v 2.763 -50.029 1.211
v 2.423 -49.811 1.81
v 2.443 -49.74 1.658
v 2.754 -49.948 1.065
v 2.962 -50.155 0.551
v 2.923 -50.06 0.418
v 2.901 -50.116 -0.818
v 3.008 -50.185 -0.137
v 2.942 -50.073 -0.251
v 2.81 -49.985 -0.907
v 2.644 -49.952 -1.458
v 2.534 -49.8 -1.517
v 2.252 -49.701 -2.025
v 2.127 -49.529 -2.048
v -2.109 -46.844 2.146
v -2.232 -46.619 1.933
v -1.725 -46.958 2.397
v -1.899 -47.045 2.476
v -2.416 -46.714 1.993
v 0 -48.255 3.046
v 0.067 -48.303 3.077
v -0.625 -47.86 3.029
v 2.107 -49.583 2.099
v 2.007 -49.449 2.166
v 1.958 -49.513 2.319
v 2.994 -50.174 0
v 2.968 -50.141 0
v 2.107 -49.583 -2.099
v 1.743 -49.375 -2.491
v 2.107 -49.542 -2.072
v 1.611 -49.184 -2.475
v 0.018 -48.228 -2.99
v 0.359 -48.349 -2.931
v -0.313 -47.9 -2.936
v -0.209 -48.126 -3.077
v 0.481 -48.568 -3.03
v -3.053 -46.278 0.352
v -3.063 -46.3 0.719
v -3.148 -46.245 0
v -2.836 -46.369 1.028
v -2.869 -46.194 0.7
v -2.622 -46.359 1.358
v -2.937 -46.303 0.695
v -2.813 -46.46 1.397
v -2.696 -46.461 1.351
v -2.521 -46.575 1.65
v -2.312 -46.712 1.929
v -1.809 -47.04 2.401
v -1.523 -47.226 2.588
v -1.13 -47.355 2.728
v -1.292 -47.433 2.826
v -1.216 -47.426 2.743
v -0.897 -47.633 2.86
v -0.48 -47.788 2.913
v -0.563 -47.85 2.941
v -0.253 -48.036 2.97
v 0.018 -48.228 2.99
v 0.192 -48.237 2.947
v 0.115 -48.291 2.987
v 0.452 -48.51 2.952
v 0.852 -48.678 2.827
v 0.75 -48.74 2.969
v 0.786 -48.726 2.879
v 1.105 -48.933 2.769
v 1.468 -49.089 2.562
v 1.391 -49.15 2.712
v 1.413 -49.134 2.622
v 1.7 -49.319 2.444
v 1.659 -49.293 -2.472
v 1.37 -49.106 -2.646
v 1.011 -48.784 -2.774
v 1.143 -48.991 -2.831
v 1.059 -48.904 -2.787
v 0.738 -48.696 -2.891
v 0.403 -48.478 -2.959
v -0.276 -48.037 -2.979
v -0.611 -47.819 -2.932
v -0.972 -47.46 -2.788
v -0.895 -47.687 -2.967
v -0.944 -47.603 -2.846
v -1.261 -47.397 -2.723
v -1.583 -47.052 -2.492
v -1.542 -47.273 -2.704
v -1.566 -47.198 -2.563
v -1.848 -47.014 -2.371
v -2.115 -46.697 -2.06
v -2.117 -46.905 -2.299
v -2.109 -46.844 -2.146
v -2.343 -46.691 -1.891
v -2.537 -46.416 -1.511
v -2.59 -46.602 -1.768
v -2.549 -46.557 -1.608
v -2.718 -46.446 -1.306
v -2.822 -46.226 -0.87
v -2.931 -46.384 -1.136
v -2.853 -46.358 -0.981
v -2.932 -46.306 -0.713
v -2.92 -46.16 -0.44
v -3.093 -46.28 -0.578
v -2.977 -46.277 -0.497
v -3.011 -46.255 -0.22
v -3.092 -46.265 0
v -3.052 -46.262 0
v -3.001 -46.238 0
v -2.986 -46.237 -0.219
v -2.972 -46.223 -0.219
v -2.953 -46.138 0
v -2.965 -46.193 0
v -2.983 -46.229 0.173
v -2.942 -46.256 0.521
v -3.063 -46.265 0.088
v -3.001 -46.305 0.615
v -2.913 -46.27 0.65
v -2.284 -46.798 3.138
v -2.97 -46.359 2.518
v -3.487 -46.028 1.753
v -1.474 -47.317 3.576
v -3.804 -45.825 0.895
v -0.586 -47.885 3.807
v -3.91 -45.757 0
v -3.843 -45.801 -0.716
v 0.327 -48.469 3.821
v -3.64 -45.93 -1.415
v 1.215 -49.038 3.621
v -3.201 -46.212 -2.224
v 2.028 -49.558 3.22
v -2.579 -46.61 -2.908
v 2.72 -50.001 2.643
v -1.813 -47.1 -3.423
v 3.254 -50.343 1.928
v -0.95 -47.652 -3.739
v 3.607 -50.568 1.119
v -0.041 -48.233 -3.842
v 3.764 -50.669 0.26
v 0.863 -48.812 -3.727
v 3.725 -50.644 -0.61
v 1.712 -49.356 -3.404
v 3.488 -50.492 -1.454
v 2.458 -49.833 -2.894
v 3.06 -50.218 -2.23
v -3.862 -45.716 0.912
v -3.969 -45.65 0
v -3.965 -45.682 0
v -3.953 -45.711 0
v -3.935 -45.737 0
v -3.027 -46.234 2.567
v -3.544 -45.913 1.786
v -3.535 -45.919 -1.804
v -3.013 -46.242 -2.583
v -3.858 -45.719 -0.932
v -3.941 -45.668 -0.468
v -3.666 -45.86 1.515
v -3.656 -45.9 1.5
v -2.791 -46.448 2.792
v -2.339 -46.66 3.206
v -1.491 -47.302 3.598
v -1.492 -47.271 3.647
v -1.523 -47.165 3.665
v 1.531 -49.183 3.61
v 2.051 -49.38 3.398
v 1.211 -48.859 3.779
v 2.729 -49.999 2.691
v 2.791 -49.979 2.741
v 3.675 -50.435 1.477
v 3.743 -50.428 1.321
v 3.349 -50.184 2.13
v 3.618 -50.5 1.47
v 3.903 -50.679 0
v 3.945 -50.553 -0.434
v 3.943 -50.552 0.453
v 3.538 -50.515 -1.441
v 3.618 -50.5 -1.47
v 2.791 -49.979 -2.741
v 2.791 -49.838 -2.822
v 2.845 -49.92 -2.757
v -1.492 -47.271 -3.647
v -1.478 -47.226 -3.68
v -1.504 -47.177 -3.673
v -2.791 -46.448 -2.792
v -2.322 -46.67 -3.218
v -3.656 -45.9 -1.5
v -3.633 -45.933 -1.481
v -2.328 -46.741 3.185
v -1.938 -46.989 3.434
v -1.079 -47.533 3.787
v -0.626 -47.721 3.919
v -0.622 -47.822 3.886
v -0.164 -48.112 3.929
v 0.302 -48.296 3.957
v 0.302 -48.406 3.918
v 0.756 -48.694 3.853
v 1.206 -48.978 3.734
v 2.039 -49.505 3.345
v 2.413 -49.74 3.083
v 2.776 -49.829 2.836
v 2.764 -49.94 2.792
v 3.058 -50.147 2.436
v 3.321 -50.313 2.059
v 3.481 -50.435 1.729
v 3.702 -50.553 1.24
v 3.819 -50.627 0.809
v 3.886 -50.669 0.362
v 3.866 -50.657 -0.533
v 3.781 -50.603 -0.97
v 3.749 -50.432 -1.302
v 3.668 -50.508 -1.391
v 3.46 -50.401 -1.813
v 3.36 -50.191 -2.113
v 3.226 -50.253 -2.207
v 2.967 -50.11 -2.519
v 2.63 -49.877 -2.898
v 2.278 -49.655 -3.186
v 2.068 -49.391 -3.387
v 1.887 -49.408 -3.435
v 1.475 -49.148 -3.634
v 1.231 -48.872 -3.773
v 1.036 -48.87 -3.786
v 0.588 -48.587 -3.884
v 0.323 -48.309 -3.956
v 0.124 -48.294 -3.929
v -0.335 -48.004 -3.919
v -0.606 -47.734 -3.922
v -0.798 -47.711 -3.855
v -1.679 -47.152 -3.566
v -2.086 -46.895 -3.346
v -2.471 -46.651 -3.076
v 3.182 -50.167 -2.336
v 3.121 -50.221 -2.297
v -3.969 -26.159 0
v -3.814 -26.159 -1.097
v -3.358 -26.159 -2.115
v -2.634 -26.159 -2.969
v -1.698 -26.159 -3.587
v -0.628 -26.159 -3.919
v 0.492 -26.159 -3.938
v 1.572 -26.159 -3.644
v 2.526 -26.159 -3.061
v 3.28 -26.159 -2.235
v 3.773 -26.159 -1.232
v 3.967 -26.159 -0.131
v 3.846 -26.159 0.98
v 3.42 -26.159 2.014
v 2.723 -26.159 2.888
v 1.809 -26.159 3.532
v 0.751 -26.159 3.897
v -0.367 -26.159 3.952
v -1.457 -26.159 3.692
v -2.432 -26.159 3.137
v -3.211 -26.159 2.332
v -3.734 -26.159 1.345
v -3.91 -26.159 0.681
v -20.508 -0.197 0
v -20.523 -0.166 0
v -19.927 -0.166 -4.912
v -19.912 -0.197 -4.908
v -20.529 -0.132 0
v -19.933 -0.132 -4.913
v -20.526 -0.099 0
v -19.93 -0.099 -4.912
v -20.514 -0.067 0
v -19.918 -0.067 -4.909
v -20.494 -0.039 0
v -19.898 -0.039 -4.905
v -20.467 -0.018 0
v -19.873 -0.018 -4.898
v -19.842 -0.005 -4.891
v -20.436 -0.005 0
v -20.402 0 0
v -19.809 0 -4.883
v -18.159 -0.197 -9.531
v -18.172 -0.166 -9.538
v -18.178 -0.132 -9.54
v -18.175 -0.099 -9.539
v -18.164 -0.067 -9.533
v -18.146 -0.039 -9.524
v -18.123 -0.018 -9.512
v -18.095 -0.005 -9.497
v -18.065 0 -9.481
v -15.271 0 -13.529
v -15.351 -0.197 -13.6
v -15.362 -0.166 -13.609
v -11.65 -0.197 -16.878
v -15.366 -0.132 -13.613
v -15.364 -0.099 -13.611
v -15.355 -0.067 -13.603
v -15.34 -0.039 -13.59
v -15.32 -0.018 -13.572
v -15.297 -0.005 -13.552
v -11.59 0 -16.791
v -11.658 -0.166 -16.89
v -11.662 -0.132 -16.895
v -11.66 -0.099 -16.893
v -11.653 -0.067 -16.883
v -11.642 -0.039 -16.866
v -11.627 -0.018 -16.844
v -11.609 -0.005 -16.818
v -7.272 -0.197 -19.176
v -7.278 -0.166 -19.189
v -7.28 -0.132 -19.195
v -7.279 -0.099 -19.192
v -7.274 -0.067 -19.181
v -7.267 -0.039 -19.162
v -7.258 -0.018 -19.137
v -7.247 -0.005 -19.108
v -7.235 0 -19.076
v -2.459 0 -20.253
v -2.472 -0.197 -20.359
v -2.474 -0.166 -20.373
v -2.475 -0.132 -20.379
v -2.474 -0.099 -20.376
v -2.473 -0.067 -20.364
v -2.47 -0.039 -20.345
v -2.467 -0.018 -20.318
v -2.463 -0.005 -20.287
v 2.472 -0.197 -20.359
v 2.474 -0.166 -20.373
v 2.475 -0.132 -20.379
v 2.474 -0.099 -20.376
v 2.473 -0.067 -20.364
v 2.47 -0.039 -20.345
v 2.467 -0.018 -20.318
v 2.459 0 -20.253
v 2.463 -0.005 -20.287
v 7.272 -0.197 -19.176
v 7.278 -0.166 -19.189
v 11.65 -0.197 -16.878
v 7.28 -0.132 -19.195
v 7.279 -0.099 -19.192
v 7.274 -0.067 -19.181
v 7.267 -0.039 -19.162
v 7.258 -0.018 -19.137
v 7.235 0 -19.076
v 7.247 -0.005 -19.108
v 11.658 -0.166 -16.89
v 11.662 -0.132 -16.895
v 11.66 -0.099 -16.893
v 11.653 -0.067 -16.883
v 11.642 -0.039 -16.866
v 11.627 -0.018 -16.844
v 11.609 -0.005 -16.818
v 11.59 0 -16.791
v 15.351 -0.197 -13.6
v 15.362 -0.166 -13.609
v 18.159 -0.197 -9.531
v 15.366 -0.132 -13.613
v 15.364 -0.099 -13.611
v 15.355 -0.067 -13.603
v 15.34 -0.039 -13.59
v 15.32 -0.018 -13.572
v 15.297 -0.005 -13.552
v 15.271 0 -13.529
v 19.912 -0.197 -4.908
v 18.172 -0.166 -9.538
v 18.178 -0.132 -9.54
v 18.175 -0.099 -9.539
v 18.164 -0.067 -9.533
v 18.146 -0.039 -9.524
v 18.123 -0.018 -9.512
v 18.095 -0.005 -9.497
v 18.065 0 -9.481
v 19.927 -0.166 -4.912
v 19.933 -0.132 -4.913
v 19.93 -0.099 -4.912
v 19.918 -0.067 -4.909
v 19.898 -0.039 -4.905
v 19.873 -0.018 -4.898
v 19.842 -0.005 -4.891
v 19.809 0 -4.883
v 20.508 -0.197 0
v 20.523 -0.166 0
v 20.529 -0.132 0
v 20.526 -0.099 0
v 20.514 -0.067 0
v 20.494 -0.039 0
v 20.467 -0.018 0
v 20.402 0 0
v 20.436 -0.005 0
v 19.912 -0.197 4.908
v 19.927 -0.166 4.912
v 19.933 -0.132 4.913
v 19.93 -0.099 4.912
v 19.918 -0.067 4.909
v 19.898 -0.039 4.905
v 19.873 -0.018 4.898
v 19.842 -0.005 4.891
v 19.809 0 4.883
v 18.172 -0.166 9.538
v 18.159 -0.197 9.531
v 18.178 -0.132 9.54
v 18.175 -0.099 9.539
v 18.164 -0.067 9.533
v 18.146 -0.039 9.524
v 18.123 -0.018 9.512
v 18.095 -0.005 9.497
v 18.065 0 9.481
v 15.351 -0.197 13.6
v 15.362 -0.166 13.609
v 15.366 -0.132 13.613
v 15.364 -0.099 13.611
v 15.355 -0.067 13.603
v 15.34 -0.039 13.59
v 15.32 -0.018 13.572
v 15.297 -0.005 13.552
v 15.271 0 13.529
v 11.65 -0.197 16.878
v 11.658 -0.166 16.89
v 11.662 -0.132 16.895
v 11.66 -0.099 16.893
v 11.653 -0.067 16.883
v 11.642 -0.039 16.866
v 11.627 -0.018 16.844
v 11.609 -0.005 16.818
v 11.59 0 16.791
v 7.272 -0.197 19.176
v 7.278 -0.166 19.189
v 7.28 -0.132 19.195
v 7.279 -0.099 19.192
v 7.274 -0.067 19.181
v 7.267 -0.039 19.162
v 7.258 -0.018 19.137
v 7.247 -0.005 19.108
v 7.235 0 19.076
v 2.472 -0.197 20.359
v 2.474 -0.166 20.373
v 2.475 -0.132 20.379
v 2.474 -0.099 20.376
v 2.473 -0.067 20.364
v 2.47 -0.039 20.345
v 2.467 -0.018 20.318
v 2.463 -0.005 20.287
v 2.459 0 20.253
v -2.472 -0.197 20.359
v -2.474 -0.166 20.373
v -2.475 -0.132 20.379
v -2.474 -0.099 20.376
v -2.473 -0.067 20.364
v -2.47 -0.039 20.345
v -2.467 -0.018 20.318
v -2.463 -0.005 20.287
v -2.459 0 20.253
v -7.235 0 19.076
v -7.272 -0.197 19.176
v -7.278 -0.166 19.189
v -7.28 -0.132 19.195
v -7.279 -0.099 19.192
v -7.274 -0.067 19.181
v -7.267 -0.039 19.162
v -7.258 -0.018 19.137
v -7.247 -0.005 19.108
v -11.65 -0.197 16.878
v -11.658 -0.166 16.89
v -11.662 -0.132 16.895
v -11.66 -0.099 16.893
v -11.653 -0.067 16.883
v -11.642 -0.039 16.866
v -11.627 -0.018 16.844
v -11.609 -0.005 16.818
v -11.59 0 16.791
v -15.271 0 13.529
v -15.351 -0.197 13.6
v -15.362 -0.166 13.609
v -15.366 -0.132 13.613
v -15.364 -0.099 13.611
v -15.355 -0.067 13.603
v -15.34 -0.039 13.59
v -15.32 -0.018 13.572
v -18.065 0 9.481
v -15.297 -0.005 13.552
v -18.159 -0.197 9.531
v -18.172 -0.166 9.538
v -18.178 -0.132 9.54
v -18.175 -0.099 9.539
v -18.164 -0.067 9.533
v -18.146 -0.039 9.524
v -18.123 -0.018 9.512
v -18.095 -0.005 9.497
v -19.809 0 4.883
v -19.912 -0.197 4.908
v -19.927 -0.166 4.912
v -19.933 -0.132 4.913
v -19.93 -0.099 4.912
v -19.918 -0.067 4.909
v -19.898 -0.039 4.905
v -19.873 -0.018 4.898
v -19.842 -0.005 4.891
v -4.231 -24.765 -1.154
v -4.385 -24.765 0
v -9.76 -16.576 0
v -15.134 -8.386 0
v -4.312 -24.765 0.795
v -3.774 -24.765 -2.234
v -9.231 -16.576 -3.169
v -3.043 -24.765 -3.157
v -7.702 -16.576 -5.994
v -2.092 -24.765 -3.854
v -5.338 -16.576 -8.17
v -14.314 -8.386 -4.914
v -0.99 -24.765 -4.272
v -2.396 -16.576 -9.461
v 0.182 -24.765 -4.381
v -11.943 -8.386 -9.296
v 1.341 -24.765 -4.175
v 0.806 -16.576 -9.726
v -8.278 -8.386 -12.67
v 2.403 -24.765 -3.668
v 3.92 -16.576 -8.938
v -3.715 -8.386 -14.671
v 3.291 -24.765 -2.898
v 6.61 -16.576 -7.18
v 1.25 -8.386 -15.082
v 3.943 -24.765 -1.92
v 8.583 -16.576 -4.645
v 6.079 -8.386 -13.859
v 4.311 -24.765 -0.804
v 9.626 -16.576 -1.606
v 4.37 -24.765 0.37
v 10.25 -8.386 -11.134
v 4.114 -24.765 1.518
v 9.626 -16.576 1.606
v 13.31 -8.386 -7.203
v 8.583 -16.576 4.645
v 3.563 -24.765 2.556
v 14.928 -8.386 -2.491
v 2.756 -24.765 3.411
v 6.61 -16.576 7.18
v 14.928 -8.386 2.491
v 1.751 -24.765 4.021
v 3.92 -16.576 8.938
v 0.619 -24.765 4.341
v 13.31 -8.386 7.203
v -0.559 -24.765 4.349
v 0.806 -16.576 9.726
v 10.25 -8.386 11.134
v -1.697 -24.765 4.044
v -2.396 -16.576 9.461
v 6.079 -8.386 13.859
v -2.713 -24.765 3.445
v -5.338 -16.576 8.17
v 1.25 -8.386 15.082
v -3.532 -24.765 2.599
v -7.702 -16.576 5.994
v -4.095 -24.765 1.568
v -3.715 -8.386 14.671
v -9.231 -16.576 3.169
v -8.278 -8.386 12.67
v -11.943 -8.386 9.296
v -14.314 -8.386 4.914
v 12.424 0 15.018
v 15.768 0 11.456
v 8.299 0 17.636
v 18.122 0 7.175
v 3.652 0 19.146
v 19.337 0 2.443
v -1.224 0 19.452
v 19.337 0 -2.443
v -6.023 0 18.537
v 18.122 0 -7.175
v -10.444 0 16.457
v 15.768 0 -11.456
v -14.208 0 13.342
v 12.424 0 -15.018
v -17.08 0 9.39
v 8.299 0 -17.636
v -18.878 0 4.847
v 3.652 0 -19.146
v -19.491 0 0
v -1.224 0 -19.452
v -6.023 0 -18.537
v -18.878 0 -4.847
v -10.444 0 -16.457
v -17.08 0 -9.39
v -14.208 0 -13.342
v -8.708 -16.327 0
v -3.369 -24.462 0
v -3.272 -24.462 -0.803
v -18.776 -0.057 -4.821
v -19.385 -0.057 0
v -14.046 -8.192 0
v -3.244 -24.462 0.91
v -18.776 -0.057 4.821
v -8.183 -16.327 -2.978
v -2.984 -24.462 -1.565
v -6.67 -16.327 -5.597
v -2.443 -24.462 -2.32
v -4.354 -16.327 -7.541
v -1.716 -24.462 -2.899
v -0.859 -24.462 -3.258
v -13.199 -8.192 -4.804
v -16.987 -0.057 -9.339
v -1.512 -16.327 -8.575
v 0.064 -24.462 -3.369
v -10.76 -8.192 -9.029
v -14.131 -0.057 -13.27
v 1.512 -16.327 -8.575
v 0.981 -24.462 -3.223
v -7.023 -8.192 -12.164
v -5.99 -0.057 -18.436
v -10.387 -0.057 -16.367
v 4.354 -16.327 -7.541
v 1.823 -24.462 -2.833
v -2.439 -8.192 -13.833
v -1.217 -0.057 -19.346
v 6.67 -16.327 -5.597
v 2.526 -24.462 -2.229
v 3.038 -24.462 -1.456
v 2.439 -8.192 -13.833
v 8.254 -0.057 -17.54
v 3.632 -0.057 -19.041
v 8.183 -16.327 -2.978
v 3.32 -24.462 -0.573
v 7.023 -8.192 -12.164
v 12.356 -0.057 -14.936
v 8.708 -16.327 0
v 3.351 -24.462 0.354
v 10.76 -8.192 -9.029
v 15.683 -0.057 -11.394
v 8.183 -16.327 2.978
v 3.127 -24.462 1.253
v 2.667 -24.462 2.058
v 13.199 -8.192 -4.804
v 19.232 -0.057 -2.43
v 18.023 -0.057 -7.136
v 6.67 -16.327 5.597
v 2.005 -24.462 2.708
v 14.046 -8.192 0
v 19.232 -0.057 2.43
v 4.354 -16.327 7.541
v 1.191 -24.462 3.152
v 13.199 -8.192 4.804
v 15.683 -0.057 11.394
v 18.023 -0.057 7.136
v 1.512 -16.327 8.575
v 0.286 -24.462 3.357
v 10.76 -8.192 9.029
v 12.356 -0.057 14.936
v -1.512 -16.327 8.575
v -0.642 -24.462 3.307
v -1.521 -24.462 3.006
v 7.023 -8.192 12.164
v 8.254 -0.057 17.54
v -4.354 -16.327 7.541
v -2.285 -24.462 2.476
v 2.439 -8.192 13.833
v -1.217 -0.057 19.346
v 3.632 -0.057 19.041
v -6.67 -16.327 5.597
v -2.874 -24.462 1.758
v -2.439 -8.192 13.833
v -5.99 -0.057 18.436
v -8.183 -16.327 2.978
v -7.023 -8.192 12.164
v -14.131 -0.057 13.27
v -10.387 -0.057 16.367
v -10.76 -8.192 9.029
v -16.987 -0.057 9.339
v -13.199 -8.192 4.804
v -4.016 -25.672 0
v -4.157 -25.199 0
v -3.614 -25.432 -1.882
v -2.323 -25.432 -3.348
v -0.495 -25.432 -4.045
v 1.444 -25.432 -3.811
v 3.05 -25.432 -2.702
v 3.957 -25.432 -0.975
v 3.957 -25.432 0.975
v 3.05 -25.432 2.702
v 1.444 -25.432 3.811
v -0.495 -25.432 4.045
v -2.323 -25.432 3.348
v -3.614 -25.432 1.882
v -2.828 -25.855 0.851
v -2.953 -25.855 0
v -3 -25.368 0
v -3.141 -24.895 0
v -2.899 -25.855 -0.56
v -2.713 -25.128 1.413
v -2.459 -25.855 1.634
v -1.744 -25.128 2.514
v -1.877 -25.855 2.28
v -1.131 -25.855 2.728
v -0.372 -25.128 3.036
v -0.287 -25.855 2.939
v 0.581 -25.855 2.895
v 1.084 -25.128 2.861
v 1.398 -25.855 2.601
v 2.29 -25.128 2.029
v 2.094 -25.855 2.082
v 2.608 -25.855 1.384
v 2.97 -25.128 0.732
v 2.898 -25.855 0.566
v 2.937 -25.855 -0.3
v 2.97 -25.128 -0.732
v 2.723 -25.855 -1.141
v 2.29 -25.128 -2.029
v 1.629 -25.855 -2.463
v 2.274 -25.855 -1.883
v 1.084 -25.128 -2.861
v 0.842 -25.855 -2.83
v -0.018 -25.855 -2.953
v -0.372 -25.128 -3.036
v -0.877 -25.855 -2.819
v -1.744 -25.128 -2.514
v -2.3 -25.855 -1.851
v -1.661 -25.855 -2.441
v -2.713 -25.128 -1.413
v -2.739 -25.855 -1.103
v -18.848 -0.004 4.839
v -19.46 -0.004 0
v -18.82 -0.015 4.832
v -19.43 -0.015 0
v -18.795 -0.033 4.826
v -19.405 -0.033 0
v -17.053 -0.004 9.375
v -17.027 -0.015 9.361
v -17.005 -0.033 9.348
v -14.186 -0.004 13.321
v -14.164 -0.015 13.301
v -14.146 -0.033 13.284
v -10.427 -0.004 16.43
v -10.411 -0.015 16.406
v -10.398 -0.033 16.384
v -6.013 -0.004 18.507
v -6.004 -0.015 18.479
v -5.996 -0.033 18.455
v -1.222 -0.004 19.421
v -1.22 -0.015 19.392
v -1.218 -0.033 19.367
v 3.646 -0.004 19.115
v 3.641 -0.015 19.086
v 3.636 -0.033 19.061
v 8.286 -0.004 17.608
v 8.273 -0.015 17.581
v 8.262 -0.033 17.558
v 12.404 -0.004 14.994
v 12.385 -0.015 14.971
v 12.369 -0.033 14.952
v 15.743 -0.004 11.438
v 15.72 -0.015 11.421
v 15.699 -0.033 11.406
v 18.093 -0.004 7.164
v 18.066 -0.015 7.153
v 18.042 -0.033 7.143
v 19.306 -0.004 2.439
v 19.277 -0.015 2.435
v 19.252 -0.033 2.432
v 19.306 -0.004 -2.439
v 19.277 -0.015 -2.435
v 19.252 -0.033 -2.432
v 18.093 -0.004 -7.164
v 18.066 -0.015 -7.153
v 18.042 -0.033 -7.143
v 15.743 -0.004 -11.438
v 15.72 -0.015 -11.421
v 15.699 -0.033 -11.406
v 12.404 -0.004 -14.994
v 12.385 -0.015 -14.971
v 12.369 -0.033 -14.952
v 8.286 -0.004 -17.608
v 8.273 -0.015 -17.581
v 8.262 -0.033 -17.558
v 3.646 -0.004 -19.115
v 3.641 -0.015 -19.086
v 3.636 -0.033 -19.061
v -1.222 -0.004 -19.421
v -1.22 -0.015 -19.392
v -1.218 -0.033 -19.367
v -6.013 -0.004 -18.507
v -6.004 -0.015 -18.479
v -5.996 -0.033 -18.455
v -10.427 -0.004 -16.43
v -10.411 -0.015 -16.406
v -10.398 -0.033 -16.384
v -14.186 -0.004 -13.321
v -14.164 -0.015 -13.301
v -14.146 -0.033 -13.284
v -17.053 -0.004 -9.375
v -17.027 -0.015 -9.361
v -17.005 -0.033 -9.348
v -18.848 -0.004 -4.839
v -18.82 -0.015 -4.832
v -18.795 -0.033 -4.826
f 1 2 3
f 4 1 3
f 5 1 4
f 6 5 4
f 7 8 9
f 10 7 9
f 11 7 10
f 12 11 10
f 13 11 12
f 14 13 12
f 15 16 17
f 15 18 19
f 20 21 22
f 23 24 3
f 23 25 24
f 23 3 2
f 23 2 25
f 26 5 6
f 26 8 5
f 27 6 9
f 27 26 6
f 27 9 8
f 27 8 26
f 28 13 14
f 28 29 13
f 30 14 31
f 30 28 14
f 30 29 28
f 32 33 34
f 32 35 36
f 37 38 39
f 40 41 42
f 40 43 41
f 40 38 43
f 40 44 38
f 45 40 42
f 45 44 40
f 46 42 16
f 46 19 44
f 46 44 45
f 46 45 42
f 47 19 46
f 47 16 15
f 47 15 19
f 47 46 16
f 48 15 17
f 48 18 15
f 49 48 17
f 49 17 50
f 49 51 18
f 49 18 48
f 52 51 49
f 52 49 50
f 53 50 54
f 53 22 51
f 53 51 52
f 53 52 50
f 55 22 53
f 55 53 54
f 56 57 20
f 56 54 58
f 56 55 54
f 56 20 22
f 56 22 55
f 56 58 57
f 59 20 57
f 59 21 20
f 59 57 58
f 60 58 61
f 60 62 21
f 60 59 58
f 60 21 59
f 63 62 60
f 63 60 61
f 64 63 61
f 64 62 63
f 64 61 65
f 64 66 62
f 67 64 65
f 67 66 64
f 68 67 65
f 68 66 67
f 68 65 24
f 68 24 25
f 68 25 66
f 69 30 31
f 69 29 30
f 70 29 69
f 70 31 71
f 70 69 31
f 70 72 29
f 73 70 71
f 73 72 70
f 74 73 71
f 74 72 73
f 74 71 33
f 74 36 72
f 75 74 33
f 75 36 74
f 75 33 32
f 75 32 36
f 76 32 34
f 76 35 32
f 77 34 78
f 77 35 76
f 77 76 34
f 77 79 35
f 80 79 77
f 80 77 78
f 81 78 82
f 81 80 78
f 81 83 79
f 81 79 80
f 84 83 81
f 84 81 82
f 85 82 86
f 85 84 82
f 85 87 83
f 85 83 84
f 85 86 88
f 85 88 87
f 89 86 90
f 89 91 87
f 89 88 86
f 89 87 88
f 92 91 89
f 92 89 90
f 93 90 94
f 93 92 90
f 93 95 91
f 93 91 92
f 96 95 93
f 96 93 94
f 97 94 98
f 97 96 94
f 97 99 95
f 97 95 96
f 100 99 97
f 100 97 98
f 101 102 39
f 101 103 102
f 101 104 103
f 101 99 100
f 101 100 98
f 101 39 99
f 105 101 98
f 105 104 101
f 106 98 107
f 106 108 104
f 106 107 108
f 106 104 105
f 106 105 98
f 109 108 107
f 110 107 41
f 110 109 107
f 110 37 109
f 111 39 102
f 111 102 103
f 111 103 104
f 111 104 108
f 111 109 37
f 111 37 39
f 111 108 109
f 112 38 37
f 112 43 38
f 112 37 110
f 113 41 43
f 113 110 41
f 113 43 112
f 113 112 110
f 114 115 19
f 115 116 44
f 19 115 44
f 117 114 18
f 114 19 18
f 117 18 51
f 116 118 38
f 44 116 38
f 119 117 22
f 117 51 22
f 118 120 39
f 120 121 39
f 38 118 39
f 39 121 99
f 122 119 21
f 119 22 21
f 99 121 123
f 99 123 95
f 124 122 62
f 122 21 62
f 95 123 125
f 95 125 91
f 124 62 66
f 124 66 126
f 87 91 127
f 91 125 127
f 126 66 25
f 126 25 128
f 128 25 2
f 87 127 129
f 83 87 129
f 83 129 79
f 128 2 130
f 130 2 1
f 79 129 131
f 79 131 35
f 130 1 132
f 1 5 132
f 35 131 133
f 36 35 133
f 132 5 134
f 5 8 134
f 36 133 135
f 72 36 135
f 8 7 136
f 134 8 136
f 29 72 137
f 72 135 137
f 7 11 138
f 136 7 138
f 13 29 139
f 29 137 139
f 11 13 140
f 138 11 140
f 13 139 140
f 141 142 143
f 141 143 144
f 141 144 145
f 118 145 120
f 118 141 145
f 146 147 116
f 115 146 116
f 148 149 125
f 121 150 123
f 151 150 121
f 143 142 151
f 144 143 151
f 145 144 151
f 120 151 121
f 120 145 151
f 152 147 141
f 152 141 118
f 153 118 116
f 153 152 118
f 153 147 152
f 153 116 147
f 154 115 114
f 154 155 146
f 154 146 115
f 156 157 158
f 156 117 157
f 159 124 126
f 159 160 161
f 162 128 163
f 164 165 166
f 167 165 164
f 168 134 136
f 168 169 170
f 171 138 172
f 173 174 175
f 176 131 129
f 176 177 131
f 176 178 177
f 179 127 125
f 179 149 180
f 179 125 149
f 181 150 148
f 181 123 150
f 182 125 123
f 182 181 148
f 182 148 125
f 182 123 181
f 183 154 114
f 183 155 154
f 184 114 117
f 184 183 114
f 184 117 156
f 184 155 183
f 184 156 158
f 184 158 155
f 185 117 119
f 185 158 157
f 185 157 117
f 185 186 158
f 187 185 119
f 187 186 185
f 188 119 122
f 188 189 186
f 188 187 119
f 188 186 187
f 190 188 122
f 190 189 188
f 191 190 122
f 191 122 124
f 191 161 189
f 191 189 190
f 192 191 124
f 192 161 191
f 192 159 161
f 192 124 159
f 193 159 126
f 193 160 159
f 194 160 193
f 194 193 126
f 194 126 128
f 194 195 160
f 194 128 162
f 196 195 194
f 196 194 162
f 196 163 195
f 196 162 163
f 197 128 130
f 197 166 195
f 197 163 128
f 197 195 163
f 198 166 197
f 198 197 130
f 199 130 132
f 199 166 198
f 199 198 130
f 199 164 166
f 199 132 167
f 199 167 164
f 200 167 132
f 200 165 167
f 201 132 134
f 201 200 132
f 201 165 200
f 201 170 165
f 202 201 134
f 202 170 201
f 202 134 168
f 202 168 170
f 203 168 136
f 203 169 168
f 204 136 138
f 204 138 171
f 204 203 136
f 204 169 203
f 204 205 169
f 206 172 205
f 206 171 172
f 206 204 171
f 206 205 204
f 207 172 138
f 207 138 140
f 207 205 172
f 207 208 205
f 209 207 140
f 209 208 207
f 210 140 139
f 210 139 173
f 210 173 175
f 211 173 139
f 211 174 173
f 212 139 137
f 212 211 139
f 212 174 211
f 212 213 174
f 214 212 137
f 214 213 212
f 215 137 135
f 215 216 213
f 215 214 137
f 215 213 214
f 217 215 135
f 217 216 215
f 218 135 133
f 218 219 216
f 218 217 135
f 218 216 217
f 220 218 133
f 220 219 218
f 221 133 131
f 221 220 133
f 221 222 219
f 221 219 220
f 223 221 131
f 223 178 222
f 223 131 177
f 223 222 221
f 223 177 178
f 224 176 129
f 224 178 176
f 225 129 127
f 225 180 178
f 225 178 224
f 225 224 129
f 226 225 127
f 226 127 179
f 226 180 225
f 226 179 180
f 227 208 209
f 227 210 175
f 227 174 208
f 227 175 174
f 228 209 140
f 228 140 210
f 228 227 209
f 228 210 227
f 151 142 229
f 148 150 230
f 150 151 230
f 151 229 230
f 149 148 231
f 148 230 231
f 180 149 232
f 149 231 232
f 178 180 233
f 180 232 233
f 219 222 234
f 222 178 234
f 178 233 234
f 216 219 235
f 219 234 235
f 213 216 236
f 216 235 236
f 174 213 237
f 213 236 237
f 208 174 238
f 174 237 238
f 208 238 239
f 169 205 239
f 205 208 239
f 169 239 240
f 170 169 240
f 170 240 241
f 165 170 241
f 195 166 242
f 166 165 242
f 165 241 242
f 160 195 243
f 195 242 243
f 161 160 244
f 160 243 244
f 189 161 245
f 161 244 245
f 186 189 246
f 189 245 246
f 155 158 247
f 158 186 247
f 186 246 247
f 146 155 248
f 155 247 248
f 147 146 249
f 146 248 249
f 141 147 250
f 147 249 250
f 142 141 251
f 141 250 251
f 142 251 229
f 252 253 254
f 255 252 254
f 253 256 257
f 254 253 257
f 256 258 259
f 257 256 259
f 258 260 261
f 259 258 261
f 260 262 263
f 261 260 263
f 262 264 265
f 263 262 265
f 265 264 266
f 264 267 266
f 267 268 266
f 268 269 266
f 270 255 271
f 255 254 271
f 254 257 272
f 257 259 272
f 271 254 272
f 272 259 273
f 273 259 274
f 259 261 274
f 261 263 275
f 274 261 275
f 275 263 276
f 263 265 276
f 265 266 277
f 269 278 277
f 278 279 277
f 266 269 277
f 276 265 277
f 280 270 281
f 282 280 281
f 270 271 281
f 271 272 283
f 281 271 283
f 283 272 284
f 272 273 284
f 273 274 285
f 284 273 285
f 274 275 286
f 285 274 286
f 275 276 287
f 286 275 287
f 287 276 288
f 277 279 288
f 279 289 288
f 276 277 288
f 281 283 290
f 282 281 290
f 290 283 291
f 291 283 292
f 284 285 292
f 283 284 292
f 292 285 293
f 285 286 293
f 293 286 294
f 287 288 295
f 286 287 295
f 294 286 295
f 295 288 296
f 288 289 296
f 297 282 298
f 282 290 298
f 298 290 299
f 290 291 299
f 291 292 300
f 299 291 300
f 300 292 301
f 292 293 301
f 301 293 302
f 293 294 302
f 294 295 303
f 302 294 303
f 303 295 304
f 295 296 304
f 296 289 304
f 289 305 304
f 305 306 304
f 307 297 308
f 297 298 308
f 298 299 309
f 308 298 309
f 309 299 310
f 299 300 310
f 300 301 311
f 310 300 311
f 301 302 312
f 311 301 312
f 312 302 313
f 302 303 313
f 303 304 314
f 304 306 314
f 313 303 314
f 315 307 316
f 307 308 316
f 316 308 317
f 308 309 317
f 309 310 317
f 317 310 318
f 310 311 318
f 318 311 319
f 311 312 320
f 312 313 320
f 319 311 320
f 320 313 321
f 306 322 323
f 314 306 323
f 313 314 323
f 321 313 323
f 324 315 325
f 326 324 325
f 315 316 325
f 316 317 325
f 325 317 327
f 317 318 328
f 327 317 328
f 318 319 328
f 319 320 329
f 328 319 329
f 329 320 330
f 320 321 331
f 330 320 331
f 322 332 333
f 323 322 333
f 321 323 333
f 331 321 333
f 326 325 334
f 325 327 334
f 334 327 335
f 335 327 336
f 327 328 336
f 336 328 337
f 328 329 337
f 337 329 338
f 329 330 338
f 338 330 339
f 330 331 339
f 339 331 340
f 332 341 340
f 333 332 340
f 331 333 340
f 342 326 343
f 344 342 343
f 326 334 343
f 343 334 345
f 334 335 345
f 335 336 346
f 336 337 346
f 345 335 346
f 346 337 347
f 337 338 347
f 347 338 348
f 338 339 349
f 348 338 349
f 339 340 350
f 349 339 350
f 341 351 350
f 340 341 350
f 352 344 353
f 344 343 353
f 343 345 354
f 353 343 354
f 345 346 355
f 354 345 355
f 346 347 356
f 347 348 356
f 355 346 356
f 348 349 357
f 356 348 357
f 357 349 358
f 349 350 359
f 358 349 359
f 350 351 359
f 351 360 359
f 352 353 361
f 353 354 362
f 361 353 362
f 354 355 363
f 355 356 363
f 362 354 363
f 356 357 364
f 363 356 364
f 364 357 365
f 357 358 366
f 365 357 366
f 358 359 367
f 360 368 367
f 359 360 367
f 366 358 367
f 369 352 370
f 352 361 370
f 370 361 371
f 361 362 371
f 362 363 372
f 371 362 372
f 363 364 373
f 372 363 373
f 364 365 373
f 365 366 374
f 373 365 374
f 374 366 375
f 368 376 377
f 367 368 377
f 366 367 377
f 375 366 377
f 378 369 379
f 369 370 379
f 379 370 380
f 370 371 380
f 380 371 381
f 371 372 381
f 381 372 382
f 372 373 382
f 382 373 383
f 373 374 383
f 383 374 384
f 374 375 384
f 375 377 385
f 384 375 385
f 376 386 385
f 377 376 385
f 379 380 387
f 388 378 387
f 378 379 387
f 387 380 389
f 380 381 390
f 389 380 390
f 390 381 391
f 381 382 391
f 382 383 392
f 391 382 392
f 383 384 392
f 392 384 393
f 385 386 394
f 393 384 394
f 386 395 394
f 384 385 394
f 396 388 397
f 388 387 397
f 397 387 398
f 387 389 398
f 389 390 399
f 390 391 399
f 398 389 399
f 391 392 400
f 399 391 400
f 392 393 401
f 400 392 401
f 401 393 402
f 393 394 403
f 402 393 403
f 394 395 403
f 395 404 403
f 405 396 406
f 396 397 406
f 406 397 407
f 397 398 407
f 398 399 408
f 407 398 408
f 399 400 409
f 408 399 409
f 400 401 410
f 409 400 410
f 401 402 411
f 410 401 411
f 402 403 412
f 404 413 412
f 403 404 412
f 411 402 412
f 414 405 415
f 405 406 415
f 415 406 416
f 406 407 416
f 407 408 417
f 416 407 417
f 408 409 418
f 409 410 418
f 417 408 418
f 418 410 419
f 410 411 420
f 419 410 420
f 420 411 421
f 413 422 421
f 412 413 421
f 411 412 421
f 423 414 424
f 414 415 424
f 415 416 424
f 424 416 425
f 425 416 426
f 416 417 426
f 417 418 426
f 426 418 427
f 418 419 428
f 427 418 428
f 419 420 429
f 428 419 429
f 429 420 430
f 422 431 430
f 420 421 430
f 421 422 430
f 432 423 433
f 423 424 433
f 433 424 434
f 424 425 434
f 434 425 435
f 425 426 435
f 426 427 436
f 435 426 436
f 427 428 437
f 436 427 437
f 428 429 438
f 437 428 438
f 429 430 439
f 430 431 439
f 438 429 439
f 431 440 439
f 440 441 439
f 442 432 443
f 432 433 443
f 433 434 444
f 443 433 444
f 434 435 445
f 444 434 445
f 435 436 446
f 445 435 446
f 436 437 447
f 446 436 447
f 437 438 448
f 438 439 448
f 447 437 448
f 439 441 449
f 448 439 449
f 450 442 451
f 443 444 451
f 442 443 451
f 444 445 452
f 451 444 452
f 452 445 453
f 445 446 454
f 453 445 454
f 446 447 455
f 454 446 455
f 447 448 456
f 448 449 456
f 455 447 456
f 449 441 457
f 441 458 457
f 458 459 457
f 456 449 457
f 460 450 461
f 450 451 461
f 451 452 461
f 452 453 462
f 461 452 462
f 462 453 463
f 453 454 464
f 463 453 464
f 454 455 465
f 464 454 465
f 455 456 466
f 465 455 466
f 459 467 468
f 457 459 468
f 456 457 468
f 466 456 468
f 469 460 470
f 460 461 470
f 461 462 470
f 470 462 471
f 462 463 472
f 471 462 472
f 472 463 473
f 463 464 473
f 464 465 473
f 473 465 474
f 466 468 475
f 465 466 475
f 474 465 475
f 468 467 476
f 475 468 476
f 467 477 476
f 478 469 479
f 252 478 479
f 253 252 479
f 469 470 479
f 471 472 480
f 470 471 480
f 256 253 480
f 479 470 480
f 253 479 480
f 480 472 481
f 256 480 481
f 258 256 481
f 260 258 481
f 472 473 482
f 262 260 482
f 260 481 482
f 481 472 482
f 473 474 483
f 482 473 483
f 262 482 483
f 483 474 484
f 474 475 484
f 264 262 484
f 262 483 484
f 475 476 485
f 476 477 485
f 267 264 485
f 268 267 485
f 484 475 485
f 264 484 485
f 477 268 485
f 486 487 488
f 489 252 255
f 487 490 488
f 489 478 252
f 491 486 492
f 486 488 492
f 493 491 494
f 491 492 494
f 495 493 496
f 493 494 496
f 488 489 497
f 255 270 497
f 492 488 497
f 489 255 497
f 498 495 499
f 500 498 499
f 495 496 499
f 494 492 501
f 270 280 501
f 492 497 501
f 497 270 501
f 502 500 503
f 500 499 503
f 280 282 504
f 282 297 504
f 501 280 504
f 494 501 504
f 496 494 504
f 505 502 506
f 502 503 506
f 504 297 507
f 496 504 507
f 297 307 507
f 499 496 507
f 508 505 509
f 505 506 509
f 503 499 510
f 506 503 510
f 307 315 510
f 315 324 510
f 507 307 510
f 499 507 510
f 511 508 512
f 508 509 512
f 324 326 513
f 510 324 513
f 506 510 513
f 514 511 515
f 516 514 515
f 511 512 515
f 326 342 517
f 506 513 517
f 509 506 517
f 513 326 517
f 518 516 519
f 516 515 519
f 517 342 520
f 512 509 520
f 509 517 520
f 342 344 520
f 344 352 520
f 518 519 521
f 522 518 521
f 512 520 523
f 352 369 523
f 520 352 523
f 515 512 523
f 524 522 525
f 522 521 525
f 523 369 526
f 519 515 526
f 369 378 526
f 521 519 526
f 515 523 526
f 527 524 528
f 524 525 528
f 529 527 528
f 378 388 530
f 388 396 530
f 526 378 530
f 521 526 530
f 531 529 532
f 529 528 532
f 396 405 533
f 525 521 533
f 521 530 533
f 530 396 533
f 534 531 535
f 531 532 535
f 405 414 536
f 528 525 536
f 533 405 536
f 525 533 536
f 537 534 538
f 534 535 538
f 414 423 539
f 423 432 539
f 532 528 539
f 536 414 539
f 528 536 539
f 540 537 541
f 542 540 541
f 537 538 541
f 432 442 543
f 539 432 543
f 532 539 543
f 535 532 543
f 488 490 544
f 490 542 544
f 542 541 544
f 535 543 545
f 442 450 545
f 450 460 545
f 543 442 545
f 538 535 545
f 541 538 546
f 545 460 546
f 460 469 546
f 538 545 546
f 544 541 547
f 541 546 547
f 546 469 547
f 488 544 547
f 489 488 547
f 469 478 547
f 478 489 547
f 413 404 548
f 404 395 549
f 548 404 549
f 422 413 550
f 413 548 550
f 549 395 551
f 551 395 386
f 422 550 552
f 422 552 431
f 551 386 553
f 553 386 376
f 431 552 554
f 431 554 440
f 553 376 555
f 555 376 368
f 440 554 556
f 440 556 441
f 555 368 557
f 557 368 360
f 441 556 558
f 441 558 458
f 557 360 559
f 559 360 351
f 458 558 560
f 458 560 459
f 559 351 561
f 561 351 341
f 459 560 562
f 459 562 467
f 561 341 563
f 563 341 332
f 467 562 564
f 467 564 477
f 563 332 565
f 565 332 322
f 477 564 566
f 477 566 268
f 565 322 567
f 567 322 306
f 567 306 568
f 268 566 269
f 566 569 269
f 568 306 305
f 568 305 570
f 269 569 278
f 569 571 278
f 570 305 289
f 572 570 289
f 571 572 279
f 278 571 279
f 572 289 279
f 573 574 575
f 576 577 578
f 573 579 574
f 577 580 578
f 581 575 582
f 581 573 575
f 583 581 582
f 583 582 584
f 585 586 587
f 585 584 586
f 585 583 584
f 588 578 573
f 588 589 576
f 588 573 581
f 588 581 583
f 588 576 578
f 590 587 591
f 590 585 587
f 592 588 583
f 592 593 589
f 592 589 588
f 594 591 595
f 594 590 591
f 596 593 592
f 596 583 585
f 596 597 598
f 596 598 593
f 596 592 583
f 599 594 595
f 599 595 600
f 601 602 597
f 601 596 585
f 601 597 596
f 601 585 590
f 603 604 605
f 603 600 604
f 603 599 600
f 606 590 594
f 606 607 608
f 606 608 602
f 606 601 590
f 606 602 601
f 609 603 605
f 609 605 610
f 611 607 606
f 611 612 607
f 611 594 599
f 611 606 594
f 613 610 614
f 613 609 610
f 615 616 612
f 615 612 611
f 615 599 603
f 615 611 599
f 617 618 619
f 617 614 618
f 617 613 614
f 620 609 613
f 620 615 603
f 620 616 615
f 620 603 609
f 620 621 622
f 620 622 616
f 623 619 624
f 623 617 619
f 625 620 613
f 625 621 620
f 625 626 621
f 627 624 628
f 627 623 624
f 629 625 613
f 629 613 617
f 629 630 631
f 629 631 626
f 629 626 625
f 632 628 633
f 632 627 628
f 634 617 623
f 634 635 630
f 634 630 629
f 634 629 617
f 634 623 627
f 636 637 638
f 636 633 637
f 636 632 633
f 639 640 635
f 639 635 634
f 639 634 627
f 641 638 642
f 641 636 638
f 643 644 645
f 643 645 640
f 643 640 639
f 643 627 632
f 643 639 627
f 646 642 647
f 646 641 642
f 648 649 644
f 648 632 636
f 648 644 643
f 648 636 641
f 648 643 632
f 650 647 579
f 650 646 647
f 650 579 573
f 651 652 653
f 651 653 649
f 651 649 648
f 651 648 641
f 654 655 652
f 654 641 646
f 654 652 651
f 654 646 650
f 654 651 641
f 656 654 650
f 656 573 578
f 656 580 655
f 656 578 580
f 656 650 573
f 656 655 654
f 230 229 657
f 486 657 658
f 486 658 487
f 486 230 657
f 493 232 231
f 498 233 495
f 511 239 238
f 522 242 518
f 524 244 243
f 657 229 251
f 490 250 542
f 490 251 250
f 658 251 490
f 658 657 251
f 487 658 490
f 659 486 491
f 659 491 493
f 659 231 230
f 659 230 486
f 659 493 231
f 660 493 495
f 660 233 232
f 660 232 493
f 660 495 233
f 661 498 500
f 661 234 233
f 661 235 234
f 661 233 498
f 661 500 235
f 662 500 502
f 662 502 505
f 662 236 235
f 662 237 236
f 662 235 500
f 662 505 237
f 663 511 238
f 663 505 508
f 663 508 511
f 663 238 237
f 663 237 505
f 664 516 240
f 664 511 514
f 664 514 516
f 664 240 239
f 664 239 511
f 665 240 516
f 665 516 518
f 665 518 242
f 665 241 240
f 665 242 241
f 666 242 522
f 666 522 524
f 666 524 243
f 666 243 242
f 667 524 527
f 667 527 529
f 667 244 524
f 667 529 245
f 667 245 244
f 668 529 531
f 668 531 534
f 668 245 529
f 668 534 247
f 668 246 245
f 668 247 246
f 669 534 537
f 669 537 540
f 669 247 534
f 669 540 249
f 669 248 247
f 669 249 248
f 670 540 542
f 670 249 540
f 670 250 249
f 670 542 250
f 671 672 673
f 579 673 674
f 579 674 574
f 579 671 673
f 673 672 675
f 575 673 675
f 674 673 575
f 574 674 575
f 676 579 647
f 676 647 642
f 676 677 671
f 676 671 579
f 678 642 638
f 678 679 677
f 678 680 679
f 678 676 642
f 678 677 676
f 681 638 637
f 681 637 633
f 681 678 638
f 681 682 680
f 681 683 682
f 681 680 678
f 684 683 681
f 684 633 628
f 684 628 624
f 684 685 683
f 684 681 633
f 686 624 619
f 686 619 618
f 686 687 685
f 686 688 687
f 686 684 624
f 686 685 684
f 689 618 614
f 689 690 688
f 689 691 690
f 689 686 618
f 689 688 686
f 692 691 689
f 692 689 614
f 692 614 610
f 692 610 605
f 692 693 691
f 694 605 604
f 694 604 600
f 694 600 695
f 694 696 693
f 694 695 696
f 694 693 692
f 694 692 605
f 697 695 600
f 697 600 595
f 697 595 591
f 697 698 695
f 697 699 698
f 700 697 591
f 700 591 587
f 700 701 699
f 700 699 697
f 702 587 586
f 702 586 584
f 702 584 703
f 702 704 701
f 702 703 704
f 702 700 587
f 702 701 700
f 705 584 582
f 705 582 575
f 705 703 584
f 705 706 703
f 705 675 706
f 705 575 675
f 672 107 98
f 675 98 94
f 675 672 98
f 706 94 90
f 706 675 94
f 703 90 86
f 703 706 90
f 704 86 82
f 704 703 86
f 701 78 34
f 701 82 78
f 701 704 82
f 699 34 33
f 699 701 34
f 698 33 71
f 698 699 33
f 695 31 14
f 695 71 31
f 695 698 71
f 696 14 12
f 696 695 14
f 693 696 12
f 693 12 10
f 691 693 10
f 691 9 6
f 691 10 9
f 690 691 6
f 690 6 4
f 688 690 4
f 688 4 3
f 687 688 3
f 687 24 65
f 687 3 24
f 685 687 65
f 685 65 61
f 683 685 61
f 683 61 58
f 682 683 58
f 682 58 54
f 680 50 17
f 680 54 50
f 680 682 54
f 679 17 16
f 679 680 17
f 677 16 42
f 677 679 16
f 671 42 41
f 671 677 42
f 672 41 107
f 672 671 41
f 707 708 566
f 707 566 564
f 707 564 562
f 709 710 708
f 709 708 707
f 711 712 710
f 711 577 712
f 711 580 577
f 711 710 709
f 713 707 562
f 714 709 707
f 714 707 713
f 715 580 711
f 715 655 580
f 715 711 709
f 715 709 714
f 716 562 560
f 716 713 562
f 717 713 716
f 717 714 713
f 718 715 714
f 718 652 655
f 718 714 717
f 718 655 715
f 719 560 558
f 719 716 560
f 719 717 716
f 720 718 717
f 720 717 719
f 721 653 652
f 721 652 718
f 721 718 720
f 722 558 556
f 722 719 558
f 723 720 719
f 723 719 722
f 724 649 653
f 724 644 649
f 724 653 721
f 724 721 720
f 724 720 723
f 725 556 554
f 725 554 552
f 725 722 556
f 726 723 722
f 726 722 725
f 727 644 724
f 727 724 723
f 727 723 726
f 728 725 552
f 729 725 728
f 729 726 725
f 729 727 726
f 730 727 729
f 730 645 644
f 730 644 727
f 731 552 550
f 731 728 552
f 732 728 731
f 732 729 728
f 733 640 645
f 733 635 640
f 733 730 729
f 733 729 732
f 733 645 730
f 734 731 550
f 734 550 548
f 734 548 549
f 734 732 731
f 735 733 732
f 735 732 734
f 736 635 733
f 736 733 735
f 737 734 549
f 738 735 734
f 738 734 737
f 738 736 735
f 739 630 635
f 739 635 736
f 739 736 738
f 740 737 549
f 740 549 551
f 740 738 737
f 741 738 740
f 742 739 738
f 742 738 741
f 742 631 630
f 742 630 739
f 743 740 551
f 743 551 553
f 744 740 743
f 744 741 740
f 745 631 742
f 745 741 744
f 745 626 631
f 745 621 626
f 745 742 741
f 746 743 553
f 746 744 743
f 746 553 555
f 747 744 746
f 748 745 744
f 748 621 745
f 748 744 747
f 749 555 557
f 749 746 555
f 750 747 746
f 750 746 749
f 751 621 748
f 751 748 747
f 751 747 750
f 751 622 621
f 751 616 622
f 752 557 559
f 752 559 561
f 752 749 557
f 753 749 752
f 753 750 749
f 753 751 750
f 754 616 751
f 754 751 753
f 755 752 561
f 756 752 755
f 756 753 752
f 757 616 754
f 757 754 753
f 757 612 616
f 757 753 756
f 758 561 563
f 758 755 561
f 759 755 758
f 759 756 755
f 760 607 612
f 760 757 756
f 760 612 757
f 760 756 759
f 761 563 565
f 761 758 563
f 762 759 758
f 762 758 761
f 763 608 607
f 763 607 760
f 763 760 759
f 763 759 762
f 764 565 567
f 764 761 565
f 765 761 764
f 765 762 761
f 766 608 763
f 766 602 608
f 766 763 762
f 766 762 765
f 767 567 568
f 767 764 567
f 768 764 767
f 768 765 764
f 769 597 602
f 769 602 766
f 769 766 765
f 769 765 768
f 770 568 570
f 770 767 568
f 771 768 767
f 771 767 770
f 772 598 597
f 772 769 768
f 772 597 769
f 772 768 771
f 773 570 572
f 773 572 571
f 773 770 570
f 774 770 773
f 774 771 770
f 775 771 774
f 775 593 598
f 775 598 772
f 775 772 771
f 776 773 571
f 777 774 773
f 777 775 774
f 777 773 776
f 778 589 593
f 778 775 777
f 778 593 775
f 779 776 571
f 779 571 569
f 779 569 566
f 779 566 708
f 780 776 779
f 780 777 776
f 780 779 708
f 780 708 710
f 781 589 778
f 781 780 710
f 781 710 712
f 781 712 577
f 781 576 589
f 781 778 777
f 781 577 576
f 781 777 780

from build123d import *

# Parameters (mm, degrees)
SHELL1_T                = -1.016
CUT_EXTRUDE1_DEPTH      = 60.691688806
CUT_EXTRUDE1_DEPTH_BACK = 60.691688806
FILLET1_R               = 2.54
FILLET2_R               = 0.127


with BuildPart() as part:
    # Sketch1 → Revolve1 (revolve)
    with BuildSketch(Plane.XY):
        Polygon((0, 0), (0, -52.07), (-3.96875, -52.07), (-3.96875, -25.4), (-20.6375, 0), align=None)
    revolve(axis=Axis((0, 0, 0), (0, -1, 0)))

    # Shell1
    shell1_openings = [part.faces().sort_by_distance(p)[0] for p in [
        (0, 0, 0),
    ]]
    offset(amount=SHELL1_T, openings=shell1_openings, kind=Kind.INTERSECTION)

    # Sketch2 → Cut-Extrude1 (cut, two sides: drawn at the far end of the back side and taken through both)
    with BuildSketch(Plane.XY.offset(-CUT_EXTRUDE1_DEPTH_BACK)):
        Polygon((-3.96875, -45.72), (3.96875, -50.8), (3.96875, -52.07), (-3.96875, -52.07), align=None)
    extrude(amount=CUT_EXTRUDE1_DEPTH + CUT_EXTRUDE1_DEPTH_BACK, mode=Mode.SUBTRACT)

    # Fillet1
    fillet1_edges = [part.edges().sort_by_distance(p)[0] for p in [
        (2.95275, -25.096394118, 0),
        (3.96875, -25.4, 0),
    ]]
    fillet(fillet1_edges, radius=FILLET1_R)

    # Fillet2
    fillet2_edges = [part.edges().sort_by_distance(p)[0] for p in [
        (19.42225864, 0, 0),
        (1e-09, -48.260000001, -3.96875),
        (2.952749993, -50.149759995, -0.000204398),
        (20.6375, 0, 0),
    ]]
    fillet(fillet2_edges, radius=FILLET2_R)


solid = part.part
